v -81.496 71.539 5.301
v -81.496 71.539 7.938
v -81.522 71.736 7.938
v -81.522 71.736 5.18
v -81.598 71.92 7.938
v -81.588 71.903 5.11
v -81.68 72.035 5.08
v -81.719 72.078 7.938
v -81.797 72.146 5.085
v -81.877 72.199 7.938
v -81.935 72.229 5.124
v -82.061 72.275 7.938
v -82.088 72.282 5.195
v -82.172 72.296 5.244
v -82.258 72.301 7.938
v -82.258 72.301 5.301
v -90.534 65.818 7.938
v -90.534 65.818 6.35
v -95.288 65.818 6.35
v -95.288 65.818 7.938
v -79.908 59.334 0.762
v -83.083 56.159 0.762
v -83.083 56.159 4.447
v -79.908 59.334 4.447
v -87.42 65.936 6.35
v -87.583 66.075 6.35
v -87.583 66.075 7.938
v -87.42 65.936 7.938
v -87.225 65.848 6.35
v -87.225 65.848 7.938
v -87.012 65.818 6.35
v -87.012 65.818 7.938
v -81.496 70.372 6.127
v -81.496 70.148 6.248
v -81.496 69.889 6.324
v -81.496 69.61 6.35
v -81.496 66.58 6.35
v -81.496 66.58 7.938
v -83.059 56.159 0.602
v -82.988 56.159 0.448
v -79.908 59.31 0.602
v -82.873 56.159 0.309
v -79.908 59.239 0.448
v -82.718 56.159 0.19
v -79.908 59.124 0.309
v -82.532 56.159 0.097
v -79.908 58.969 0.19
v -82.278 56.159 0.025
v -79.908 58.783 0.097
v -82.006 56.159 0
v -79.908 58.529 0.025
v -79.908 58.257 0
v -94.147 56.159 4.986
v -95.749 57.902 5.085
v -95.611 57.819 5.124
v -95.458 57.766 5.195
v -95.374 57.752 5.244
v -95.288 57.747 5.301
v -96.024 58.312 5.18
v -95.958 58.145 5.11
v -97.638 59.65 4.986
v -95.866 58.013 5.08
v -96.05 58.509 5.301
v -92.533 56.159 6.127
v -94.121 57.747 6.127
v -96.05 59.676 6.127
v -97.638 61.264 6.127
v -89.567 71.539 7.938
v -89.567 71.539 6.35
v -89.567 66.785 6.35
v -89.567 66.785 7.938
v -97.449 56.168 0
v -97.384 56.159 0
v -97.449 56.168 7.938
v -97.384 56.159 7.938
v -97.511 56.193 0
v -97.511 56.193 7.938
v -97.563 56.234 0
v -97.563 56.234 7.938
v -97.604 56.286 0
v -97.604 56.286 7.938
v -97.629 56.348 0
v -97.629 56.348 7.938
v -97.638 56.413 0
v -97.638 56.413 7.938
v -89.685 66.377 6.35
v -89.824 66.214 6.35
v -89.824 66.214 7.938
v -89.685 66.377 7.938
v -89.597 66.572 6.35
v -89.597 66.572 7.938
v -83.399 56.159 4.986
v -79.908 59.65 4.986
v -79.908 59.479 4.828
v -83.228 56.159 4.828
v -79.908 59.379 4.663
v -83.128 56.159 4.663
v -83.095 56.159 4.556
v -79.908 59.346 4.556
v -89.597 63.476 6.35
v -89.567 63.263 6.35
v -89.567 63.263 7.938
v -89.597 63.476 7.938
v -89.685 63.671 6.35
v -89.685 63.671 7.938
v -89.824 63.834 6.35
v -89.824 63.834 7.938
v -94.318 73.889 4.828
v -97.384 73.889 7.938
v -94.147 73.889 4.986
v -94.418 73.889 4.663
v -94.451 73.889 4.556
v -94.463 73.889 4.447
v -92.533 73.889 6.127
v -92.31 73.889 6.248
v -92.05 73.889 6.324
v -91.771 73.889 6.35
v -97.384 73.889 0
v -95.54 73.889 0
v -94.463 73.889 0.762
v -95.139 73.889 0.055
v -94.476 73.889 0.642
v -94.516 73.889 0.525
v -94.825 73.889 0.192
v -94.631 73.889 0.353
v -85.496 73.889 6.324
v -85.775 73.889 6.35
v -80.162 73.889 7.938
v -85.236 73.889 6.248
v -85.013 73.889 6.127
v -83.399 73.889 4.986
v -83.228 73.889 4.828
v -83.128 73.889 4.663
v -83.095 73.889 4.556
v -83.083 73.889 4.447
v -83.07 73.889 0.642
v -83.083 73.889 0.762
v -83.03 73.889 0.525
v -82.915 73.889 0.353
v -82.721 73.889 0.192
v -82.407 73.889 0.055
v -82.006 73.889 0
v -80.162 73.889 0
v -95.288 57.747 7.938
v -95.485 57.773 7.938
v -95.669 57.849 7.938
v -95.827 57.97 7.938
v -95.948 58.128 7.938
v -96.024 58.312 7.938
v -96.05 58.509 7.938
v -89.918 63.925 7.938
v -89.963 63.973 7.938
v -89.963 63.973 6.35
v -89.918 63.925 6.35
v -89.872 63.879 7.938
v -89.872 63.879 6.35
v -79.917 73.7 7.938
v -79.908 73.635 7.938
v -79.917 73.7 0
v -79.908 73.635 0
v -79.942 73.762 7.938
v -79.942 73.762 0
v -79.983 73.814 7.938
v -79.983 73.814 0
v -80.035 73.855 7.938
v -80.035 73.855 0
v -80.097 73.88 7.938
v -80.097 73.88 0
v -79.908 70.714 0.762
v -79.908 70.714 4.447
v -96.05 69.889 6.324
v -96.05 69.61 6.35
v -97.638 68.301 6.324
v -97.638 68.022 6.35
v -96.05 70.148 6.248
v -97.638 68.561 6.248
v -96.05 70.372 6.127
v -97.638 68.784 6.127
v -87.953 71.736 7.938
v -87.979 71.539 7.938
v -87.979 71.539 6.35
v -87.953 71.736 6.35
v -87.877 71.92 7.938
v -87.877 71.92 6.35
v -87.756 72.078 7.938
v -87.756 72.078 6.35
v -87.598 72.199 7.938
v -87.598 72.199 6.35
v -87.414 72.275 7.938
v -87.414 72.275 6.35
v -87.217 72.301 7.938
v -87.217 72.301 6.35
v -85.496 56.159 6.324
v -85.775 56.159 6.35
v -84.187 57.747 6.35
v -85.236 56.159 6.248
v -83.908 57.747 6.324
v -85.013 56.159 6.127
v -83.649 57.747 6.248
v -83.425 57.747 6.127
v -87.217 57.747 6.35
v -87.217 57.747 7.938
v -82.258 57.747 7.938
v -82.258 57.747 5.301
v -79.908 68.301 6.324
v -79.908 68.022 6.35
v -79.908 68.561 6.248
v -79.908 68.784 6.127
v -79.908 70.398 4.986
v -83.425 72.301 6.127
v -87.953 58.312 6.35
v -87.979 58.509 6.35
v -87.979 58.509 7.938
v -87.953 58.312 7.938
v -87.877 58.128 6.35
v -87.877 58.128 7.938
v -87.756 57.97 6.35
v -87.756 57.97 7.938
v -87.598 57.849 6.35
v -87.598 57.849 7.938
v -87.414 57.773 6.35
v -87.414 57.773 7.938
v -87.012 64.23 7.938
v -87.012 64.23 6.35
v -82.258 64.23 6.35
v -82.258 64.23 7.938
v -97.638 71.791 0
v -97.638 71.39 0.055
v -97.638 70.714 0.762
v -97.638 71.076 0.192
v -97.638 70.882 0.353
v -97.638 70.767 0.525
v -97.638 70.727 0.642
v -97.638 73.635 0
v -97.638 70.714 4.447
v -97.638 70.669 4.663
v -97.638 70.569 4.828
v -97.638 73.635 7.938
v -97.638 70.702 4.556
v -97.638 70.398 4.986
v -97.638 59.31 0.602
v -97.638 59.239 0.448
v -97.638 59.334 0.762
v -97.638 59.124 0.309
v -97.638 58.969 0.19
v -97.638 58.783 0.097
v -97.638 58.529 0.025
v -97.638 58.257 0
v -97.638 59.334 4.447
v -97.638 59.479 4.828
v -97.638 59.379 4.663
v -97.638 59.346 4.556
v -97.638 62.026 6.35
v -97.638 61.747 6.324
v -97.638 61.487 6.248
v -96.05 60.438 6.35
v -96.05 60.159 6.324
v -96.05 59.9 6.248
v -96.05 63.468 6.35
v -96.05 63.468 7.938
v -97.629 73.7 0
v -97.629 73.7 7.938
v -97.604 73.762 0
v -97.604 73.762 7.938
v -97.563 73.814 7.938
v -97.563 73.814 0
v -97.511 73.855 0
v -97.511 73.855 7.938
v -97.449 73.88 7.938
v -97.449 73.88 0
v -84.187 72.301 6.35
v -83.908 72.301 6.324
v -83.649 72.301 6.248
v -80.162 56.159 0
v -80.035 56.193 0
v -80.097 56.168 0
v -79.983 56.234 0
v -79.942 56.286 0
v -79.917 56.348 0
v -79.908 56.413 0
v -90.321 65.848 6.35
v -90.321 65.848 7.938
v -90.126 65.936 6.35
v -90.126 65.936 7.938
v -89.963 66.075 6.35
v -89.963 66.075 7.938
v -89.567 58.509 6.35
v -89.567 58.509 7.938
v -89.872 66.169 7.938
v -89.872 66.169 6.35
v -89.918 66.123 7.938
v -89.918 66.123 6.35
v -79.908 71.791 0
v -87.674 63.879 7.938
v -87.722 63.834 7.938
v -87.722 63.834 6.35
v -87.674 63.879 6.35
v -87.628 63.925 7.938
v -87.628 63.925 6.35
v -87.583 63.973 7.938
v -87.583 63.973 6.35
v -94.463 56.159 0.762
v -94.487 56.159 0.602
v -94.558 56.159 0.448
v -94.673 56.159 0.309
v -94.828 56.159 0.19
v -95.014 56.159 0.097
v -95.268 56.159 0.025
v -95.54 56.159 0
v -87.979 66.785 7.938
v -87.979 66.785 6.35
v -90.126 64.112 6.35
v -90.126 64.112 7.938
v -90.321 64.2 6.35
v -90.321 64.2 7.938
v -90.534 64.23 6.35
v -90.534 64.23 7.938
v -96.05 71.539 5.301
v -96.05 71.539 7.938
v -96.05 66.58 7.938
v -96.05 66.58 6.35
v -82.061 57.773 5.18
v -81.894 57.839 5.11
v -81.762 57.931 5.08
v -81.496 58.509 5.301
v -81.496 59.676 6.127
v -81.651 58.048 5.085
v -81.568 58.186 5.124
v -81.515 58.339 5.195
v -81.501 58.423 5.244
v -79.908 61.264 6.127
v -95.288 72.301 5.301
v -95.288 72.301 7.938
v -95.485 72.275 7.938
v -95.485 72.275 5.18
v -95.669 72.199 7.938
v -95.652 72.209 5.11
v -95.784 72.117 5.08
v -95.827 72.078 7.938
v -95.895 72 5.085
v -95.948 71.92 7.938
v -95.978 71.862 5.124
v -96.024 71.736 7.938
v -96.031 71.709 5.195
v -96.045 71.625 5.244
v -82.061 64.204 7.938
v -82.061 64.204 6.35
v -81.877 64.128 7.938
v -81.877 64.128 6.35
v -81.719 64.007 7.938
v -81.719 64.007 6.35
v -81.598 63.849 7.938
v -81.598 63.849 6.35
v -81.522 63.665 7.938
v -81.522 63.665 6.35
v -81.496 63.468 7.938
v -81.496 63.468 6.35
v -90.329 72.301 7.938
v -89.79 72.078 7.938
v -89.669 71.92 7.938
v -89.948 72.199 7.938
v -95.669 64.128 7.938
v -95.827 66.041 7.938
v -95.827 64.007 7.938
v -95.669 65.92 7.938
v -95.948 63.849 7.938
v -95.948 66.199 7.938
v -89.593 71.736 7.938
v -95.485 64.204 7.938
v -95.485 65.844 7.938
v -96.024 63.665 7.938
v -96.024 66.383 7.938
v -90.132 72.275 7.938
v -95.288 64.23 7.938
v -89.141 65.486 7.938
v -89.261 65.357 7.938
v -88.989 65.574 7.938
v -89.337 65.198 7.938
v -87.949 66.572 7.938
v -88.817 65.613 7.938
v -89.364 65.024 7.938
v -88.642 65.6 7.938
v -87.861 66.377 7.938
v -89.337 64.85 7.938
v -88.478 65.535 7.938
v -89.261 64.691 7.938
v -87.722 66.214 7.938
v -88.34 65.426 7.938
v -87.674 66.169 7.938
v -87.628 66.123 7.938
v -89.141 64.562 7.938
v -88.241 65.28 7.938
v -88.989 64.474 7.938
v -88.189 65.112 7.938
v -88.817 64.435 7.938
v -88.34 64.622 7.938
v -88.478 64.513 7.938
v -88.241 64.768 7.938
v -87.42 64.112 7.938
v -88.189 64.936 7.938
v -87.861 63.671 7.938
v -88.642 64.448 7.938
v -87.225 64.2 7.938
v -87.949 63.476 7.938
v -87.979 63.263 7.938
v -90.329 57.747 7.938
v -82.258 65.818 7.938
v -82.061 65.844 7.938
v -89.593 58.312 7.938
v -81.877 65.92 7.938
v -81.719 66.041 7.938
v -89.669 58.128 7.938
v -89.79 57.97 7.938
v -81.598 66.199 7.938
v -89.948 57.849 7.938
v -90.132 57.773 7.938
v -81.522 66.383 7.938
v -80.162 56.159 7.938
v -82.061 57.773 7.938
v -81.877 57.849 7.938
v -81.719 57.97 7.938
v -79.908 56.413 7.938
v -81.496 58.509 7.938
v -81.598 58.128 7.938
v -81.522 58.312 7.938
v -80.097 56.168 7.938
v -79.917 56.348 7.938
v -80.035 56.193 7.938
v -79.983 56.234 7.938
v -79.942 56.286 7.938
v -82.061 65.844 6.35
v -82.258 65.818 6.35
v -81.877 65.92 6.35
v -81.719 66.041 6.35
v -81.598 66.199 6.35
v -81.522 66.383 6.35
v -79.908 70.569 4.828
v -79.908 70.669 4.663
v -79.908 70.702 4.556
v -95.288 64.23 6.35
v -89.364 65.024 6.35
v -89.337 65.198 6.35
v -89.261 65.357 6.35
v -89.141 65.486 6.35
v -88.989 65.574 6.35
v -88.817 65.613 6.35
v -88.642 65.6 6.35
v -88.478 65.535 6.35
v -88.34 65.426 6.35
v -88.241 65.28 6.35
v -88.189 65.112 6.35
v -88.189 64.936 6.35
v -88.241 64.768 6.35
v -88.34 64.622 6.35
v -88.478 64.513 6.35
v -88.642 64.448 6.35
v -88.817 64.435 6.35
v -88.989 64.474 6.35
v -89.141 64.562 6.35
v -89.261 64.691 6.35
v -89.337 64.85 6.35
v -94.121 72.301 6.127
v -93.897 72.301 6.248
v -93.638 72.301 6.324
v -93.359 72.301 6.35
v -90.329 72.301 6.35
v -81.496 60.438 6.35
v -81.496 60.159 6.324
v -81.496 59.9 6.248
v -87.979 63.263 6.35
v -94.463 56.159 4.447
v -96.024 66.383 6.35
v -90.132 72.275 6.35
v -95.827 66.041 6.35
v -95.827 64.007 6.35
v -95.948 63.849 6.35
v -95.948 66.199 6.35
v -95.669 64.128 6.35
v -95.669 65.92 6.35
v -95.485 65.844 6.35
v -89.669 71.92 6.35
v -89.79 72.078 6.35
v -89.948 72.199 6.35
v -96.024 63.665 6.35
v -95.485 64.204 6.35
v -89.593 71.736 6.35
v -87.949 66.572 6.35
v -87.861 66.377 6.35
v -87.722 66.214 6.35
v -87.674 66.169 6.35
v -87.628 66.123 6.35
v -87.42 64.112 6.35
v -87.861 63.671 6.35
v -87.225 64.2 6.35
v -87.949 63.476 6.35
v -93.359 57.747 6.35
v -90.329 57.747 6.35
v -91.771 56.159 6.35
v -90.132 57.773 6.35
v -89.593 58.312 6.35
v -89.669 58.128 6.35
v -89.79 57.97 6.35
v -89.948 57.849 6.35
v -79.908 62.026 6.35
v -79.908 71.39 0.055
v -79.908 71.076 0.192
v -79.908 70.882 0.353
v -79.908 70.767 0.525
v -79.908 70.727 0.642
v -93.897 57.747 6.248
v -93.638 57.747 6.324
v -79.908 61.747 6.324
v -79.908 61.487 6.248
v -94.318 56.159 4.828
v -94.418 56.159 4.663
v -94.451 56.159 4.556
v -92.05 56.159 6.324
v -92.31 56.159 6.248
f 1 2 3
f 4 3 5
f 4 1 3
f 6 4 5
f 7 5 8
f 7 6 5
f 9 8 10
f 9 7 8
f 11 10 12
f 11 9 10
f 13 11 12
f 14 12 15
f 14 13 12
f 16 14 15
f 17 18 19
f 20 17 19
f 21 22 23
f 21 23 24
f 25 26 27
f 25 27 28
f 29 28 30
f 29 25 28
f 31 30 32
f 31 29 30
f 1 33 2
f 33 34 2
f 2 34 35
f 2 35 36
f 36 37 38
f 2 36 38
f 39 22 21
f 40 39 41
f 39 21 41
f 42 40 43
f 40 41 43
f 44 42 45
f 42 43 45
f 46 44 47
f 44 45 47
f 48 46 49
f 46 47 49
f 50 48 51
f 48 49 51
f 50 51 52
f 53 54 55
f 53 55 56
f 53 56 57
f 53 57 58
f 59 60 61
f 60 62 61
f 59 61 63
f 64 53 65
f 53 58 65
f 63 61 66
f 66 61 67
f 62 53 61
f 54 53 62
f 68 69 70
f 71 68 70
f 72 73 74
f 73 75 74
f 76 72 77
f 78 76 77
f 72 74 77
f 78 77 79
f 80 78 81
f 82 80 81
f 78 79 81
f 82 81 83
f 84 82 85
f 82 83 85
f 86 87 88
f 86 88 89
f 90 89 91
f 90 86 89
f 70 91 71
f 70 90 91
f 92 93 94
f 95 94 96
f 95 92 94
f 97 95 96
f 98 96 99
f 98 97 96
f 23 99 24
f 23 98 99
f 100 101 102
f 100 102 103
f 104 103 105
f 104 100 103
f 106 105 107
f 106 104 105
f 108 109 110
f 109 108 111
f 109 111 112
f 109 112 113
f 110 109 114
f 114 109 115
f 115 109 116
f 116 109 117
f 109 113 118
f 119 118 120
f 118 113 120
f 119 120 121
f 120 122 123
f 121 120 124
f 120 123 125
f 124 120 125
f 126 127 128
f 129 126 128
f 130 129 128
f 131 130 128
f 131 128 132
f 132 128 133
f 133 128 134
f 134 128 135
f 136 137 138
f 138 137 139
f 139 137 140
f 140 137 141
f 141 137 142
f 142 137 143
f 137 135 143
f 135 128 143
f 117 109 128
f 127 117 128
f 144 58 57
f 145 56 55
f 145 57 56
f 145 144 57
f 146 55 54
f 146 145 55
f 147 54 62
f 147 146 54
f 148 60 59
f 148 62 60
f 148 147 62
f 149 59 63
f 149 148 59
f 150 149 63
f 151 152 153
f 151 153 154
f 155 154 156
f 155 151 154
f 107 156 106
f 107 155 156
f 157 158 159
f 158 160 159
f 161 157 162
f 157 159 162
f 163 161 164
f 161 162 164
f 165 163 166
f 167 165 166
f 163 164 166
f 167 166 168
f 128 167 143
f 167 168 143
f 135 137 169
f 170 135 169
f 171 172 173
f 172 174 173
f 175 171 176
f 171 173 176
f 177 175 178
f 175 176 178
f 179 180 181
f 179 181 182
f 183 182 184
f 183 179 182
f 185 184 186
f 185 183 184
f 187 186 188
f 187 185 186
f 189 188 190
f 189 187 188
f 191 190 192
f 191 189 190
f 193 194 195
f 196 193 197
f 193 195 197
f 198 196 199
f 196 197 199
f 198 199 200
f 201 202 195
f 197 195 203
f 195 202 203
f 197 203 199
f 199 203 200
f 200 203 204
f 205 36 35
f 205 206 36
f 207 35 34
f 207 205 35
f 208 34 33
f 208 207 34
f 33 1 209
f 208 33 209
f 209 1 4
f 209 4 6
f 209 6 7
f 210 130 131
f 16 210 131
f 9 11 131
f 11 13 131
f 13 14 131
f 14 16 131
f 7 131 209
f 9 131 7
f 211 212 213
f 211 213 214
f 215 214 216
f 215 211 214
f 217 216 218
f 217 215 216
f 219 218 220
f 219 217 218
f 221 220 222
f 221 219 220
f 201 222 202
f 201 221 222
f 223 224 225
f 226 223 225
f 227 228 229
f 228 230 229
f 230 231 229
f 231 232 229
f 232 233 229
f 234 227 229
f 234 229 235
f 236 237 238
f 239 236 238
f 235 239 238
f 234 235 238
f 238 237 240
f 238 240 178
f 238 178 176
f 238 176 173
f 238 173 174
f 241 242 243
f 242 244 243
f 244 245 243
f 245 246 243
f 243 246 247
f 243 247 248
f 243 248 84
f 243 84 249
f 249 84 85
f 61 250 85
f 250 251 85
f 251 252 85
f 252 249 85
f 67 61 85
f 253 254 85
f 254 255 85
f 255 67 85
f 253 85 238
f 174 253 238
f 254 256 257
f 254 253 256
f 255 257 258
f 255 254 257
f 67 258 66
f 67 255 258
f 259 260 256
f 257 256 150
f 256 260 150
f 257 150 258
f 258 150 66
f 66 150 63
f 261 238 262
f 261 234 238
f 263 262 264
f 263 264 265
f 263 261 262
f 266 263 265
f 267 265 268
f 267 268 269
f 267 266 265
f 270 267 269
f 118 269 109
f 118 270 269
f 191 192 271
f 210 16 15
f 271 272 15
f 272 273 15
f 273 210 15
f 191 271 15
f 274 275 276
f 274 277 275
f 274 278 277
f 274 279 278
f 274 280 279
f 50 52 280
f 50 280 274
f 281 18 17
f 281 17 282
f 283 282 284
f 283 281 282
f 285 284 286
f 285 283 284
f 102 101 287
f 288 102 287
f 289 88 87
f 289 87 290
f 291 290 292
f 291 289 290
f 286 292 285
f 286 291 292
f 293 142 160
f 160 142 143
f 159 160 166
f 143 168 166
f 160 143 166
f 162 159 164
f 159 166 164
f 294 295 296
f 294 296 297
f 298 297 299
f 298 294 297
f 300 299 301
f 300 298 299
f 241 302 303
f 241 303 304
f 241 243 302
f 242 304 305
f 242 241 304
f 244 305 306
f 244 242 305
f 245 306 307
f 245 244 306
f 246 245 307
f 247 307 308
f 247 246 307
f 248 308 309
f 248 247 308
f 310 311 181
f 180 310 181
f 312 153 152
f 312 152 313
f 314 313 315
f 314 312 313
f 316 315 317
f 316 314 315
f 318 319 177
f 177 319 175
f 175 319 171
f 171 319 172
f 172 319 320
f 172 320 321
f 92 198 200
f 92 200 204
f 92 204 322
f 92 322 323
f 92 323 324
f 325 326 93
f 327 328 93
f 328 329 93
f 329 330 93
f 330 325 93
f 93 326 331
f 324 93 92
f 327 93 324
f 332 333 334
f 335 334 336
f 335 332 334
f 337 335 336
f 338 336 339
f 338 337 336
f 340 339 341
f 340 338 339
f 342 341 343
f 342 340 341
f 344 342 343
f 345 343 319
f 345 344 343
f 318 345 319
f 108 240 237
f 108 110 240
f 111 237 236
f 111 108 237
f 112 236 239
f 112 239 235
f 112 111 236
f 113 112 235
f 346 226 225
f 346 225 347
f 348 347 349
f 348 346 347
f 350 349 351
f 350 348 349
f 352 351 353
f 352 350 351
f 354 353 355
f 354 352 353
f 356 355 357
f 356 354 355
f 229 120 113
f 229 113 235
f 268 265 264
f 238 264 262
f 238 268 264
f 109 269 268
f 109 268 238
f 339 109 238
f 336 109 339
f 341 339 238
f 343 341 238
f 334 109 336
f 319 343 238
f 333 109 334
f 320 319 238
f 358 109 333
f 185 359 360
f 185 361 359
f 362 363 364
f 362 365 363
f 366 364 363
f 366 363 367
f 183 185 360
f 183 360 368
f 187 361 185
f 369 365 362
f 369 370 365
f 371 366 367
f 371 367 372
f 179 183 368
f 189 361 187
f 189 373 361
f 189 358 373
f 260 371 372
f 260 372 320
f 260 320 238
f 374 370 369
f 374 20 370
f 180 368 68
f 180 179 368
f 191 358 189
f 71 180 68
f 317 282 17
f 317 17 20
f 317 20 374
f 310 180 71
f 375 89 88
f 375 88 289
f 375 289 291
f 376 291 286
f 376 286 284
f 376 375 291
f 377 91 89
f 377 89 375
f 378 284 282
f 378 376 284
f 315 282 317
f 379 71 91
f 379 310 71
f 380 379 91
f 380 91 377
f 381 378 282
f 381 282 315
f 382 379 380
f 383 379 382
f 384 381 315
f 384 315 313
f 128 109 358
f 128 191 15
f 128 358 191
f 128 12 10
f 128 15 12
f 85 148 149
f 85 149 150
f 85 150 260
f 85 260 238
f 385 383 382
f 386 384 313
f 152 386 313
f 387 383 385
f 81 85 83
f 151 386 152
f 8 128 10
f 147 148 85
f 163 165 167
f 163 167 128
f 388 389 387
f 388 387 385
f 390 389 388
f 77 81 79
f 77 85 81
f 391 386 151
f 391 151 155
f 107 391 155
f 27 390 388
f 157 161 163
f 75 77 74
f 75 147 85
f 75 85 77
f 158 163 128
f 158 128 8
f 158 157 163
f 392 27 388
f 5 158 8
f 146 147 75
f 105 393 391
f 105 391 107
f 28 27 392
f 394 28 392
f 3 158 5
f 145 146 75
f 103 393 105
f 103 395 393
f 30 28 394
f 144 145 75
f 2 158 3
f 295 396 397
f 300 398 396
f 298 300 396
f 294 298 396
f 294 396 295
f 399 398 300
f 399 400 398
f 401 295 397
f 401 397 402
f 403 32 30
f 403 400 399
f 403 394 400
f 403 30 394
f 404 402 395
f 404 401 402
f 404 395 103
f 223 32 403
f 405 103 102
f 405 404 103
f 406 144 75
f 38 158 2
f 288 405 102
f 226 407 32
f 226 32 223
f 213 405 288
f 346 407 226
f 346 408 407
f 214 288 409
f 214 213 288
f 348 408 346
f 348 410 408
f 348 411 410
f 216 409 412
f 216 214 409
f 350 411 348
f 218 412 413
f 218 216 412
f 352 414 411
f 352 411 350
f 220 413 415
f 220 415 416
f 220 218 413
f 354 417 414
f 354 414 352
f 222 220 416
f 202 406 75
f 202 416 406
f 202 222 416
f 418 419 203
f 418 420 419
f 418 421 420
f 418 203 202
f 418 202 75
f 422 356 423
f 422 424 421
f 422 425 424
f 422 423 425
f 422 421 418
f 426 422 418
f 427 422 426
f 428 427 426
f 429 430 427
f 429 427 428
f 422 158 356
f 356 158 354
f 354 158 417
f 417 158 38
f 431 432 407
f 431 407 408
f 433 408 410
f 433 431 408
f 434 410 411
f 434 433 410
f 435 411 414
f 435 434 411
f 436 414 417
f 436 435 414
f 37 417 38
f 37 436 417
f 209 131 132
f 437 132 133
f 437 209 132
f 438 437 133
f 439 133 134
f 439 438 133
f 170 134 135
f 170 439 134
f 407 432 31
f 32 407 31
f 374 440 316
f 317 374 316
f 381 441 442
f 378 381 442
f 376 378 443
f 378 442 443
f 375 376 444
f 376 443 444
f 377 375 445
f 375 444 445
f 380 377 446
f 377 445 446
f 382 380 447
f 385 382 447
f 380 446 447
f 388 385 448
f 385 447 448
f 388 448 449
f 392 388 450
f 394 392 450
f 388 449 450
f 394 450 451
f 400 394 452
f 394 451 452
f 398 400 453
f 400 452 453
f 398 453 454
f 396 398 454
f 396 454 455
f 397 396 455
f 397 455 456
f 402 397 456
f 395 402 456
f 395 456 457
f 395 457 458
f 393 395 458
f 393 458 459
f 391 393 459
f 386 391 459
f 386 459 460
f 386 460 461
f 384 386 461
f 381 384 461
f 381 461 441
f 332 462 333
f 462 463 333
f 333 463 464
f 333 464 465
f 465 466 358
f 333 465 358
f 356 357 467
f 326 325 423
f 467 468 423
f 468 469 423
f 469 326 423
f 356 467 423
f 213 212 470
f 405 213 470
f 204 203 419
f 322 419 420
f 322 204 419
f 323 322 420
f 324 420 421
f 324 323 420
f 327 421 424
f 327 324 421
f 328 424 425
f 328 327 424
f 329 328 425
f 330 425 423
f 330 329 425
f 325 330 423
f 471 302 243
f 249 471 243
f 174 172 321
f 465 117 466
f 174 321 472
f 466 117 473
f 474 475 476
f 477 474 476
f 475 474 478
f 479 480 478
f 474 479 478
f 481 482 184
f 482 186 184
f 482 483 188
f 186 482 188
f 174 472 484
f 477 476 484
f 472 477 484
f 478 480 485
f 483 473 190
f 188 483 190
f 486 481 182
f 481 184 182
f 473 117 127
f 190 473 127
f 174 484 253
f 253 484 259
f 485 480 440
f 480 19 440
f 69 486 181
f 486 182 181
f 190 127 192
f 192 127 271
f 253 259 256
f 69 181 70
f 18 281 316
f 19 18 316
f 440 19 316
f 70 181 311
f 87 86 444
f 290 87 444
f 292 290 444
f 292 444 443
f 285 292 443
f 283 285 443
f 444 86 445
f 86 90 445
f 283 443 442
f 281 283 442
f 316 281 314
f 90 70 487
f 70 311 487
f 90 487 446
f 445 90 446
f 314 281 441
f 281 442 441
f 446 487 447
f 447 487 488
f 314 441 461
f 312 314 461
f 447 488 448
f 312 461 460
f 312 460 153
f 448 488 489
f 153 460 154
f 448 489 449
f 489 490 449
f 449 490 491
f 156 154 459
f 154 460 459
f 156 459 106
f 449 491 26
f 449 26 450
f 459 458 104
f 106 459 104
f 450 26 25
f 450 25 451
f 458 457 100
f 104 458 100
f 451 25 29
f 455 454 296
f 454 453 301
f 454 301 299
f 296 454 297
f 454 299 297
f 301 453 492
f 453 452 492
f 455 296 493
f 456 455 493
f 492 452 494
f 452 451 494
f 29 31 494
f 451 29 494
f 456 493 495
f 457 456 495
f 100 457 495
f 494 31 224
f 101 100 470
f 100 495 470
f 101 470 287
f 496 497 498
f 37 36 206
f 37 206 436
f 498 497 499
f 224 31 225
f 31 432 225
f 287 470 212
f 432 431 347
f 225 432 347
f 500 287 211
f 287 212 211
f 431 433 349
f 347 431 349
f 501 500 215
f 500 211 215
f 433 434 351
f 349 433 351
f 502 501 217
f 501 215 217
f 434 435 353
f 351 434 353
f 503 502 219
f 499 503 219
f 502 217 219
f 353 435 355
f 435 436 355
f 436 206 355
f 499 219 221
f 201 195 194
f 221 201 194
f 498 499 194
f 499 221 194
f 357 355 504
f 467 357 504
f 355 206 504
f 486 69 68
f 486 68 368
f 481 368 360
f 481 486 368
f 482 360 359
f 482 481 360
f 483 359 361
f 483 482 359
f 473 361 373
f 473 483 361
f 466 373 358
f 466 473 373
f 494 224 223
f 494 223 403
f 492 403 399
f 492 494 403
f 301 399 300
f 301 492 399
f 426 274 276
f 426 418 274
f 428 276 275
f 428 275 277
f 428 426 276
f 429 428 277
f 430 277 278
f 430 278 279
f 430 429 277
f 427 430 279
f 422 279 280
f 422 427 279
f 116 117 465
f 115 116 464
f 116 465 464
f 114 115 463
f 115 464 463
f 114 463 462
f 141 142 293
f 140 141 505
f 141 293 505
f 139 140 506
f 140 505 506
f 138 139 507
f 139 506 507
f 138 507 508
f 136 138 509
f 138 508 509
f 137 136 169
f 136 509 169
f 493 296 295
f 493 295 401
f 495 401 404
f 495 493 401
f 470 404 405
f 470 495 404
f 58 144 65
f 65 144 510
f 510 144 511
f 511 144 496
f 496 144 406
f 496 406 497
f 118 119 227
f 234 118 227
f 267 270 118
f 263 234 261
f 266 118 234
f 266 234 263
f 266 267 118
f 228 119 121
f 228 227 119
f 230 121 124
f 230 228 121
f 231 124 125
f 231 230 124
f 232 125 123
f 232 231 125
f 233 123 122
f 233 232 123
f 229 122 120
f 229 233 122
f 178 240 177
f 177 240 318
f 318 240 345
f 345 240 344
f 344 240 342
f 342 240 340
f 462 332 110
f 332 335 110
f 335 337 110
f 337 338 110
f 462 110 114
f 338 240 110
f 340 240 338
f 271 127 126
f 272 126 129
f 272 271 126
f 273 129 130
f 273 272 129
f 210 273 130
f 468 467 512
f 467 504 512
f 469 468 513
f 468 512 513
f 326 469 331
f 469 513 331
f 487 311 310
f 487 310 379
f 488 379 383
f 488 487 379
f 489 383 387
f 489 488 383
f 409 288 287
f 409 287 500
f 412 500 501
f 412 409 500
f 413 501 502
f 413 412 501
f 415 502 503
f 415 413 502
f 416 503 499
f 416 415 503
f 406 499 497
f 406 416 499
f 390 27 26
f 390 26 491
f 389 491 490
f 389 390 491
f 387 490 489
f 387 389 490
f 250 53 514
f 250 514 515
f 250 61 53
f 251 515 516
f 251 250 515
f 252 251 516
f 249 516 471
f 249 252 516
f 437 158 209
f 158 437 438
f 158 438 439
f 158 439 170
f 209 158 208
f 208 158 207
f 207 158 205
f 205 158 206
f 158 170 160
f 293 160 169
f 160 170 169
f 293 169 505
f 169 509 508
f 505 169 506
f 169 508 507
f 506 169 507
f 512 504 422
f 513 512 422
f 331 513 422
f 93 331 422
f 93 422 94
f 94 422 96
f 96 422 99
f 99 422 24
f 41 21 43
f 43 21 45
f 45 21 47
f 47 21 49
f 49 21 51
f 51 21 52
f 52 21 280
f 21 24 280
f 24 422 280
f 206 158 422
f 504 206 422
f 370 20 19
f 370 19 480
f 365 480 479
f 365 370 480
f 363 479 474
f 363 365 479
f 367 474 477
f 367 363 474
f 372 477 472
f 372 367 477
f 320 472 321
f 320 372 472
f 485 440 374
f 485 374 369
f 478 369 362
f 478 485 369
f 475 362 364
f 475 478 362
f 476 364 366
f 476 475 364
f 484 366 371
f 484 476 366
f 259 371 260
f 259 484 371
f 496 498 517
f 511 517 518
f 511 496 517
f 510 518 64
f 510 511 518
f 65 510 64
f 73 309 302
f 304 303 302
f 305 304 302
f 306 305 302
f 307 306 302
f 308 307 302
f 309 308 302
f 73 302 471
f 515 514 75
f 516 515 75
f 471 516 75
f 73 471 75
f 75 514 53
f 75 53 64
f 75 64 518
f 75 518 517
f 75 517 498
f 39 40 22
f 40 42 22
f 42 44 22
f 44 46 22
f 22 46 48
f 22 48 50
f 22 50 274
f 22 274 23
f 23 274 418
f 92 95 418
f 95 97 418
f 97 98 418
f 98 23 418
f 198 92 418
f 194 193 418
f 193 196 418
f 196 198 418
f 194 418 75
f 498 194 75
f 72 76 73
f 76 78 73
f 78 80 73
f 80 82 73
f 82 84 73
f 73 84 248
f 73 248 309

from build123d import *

# Parameters (mm, degrees)
BOSS_EXTRUDE1_DEPTH          = 6.35
BOSS_EXTRUDE1_2_DEPTH        = 6.35
BOSS_EXTRUDE1_3_DEPTH        = 6.35
BOSS_EXTRUDE1_4_DEPTH        = 6.35
EXTRUDE_THIN1_DEPTH          = 1.5875
SKETCH2_3_W                  = 17.7292
SKETCH2_3_H                  = 17.7292
SKETCH2_3_W_2                = 14.5542
SKETCH2_3_H_2                = 14.5542
EXTRUDE_THIN2_DEPTH          = 1.5875
SKETCH6_R                    = 1.5875
BOSS_EXTRUDE3_DEPTH          = 1.5875
F_56_0_0465_DIAMETER_HOLE1_D = 1.1811
CHAMFER1_SIZE                = 1.5875
FILLET2_R                    = 0.762
FILLET3_R                    = 0.762
FILLET4_R                    = 0.254


# Read off the part's stored shape, not the designer's step: Extrude-Thin1
with BuildPart() as part:
    # Sketch1 → Boss-Extrude1 (new body)
    with BuildSketch(Plane.XY):
        Polygon((-97.6376, 73.8886), (-94.4626, 73.8886), (-97.6376, 70.7136), align=None)
    extrude(amount=BOSS_EXTRUDE1_DEPTH)



with BuildPart() as body_2:
    # Sketch1 → Boss-Extrude1 2 (new body)
    with BuildSketch(Plane.XY):
        Polygon((-79.9084, 70.7136), (-79.9084, 73.8886), (-83.0834, 73.8886), align=None)
    extrude(amount=BOSS_EXTRUDE1_2_DEPTH)


with BuildPart() as body_3:
    # Sketch1 → Boss-Extrude1 3 (new body)
    with BuildSketch(Plane.XY):
        Polygon((-79.9084, 56.1594), (-83.0834, 56.1594), (-79.9084, 59.3344), align=None)
    extrude(amount=BOSS_EXTRUDE1_3_DEPTH)


with BuildPart() as body_4:
    # Sketch1 → Boss-Extrude1 4 (new body)
    with BuildSketch(Plane.XY):
        Polygon((-97.6376, 59.3344), (-97.6376, 56.1594), (-94.4626, 56.1594), align=None)
    extrude(amount=BOSS_EXTRUDE1_4_DEPTH)


with BuildPart() as body_5:
    # Extrude-Thin1 outline → Extrude-Thin1 (new body)
    with BuildSketch(Plane.XY.offset(6.35)):
        Polygon((-89.56675, 65.81775), (-97.6376, 65.81775), (-97.6376, 64.23025), (-89.56675, 64.23025), (-89.56675, 56.1594), (-87.97925, 56.1594), (-87.97925, 64.23025), (-79.9084, 64.23025), (-79.9084, 65.81775), (-87.97925, 65.81775), (-87.97925, 73.8886), (-89.56675, 73.8886), align=None)
    extrude(amount=EXTRUDE_THIN1_DEPTH)


with BuildPart() as part_1:
    add(part.part)

    add(body_2.part)  # Extrude-Thin2 merges body 2

    add(body_3.part)  # Extrude-Thin2 merges body 3

    add(body_4.part)  # Extrude-Thin2 merges body 4

    add(body_5.part)  # Extrude-Thin2 merges body 5
    # Sketch2<3> → Extrude-Thin2 (add)
    with BuildSketch(Plane.XY.offset(6.35)):
        with Locations((-88.773, 65.024)):
            Rectangle(SKETCH2_3_W, SKETCH2_3_H)
        with Locations((-88.773, 65.024)):
            Rectangle(SKETCH2_3_W_2, SKETCH2_3_H_2, mode=Mode.SUBTRACT)
    extrude(amount=EXTRUDE_THIN2_DEPTH)

    # Sketch6 → Boss-Extrude3 (add)
    with BuildSketch(Plane.XY.offset(7.9375)):
        with Locations((-88.773, 65.024)):
            Circle(SKETCH6_R)
    extrude(amount=-BOSS_EXTRUDE3_DEPTH)

    # #56 (0.0465) Diameter Hole1 (through all)
    with Locations(Plane.XY.offset(7.9375)):
        with Locations((-88.773, 65.024)):
            Hole(F_56_0_0465_DIAMETER_HOLE1_D / 2)

    # Chamfer1
    # the kernel refuses this chamfer: 1.5875 mm, written as the material it adds along each edge
    with BuildSketch(Plane(origin=(-85.970196487, 53.272603513, 6.35), x_dir=(-0.7068394360706735, 0.7068394360706735, 0.02749587661058616), z_dir=(0.7071067811865476, 0.7071067811865476, 0))) as chamfer1_piece_1_section:
        Polygon((CHAMFER1_SIZE * 0.999621916911, -CHAMFER1_SIZE * 0.0274958766106), (-CHAMFER1_SIZE * 0.0274958766106, -CHAMFER1_SIZE * 0.999621916911), (0, 0), align=None)
    chamfer1_piece_1 = extrude(amount=6.327610774, mode=Mode.PRIVATE)
    chamfer1_piece_1 = split(chamfer1_piece_1, bisect_by=Plane(origin=(-83.03148044, 56.1594, 5.826998953), z_dir=(0, 1, 0)), keep=Keep.TOP, mode=Mode.PRIVATE)
    chamfer1_piece_1 = split(chamfer1_piece_1, bisect_by=Plane(origin=(-83.03148044, 57.7469, 5.826998953), z_dir=(0, -1, 0)), keep=Keep.TOP, mode=Mode.PRIVATE)
    add(chamfer1_piece_1)
    with BuildSketch(Plane(origin=(-81.4959, 57.7469, 6.35), x_dir=(-0.7068394360706735, 0.7068394360706735, 0.02749587661058616), z_dir=(0.7071067811865476, 0.7071067811865476, 0))) as chamfer1_piece_2_section:
        Polygon((CHAMFER1_SIZE * 0.999621916911, -CHAMFER1_SIZE * 0.0274958766106), (-CHAMFER1_SIZE * 0.0274958766106, -CHAMFER1_SIZE * 0.999621916911), (0, 0), align=None)
    chamfer1_piece_2 = extrude(amount=6.327610774, mode=Mode.PRIVATE)
    chamfer1_piece_2 = split(chamfer1_piece_2, bisect_by=Plane(origin=(-79.9084, 59.28248044, 5.826998953), z_dir=(-1, 0, 0)), keep=Keep.TOP, mode=Mode.PRIVATE)
    chamfer1_piece_2 = split(chamfer1_piece_2, bisect_by=Plane(origin=(-81.4959, 59.28248044, 5.826998953), z_dir=(1, 0, 0)), keep=Keep.TOP, mode=Mode.PRIVATE)
    add(chamfer1_piece_2)
    with BuildSketch(Plane(origin=(-81.4959, 72.3011, 6.35), x_dir=(0.01944252080601567, 0.01944252080601567, -0.9996219169112966), z_dir=(0.7071067811865476, -0.7071067811865476, 0))) as chamfer1_piece_3_section:
        Polygon((CHAMFER1_SIZE * 0.999621916911, -CHAMFER1_SIZE * 0.0274958766106), (-CHAMFER1_SIZE * 0.0274958766106, -CHAMFER1_SIZE * 0.999621916911), (0, 0), align=None)
    chamfer1_piece_3 = extrude(amount=6.327610774, mode=Mode.PRIVATE)
    chamfer1_piece_3 = split(chamfer1_piece_3, bisect_by=Plane(origin=(-79.9084, 72.313041711, 5.228115698), z_dir=(-1, 0, 0)), keep=Keep.TOP, mode=Mode.PRIVATE)
    chamfer1_piece_3 = split(chamfer1_piece_3, bisect_by=Plane(origin=(-81.4959, 72.313041711, 5.228115698), z_dir=(1, 0, 0)), keep=Keep.TOP, mode=Mode.PRIVATE)
    add(chamfer1_piece_3)
    with BuildSketch(Plane(origin=(-85.970196487, 76.775396487, 6.35), x_dir=(0.01944252080601567, 0.01944252080601567, -0.9996219169112966), z_dir=(0.7071067811865476, -0.7071067811865476, 0))) as chamfer1_piece_4_section:
        Polygon((CHAMFER1_SIZE * 0.999621916911, -CHAMFER1_SIZE * 0.0274958766106), (-CHAMFER1_SIZE * 0.0274958766106, -CHAMFER1_SIZE * 0.999621916911), (0, 0), align=None)
    chamfer1_piece_4 = extrude(amount=6.327610774, mode=Mode.PRIVATE)
    chamfer1_piece_4 = split(chamfer1_piece_4, bisect_by=Plane(origin=(-83.03148044, 73.8886, 5.826998953), z_dir=(0, -1, 0)), keep=Keep.TOP, mode=Mode.PRIVATE)
    chamfer1_piece_4 = split(chamfer1_piece_4, bisect_by=Plane(origin=(-83.03148044, 72.3011, 5.826998953), z_dir=(0, 1, 0)), keep=Keep.TOP, mode=Mode.PRIVATE)
    add(chamfer1_piece_4)
    with BuildSketch(Plane(origin=(-91.575803513, 76.775396487, 6.35), x_dir=(0.7068394360706735, -0.7068394360706735, 0.02749587661058616), z_dir=(-0.7071067811865476, -0.7071067811865476, 0))) as chamfer1_piece_5_section:
        Polygon((CHAMFER1_SIZE * 0.999621916911, -CHAMFER1_SIZE * 0.0274958766106), (-CHAMFER1_SIZE * 0.0274958766106, -CHAMFER1_SIZE * 0.999621916911), (0, 0), align=None)
    chamfer1_piece_5 = extrude(amount=6.327610774, mode=Mode.PRIVATE)
    chamfer1_piece_5 = split(chamfer1_piece_5, bisect_by=Plane(origin=(-94.51451956, 73.8886, 5.826998953), z_dir=(0, -1, 0)), keep=Keep.TOP, mode=Mode.PRIVATE)
    chamfer1_piece_5 = split(chamfer1_piece_5, bisect_by=Plane(origin=(-94.51451956, 72.3011, 5.826998953), z_dir=(0, 1, 0)), keep=Keep.TOP, mode=Mode.PRIVATE)
    add(chamfer1_piece_5)
    with BuildSketch(Plane(origin=(-96.0501, 72.3011, 6.35), x_dir=(0.7068394360706735, -0.7068394360706735, 0.02749587661058616), z_dir=(-0.7071067811865476, -0.7071067811865476, 0))) as chamfer1_piece_6_section:
        Polygon((CHAMFER1_SIZE * 0.999621916911, -CHAMFER1_SIZE * 0.0274958766106), (-CHAMFER1_SIZE * 0.0274958766106, -CHAMFER1_SIZE * 0.999621916911), (0, 0), align=None)
    chamfer1_piece_6 = extrude(amount=6.327610774, mode=Mode.PRIVATE)
    chamfer1_piece_6 = split(chamfer1_piece_6, bisect_by=Plane(origin=(-97.6376, 70.76551956, 5.826998953), z_dir=(1, 0, 0)), keep=Keep.TOP, mode=Mode.PRIVATE)
    chamfer1_piece_6 = split(chamfer1_piece_6, bisect_by=Plane(origin=(-96.0501, 70.76551956, 5.826998953), z_dir=(-1, 0, 0)), keep=Keep.TOP, mode=Mode.PRIVATE)
    add(chamfer1_piece_6)
    with BuildSketch(Plane(origin=(-91.575803513, 53.272603513, 6.35), x_dir=(0.7068394360706735, 0.7068394360706735, 0.027495876610586705), z_dir=(-0.7071067811865476, 0.7071067811865476, 0))) as chamfer1_piece_7_section:
        Polygon((CHAMFER1_SIZE * 0.999621916911, CHAMFER1_SIZE * 0.0274958766106), (-CHAMFER1_SIZE * 0.0274958766106, CHAMFER1_SIZE * 0.999621916911), (0, 0), align=None)
    chamfer1_piece_7 = extrude(amount=6.327610774, mode=Mode.PRIVATE)
    chamfer1_piece_7 = split(chamfer1_piece_7, bisect_by=Plane(origin=(-94.51451956, 56.1594, 5.826998953), z_dir=(0, 1, 0)), keep=Keep.TOP, mode=Mode.PRIVATE)
    chamfer1_piece_7 = split(chamfer1_piece_7, bisect_by=Plane(origin=(-94.51451956, 57.7469, 5.826998953), z_dir=(0, -1, 0)), keep=Keep.TOP, mode=Mode.PRIVATE)
    add(chamfer1_piece_7)
    with BuildSketch(Plane(origin=(-96.0501, 57.7469, 6.35), x_dir=(0.7068394360706735, 0.7068394360706735, 0.02749587661058616), z_dir=(-0.7071067811865476, 0.7071067811865476, 0))) as chamfer1_piece_8_section:
        Polygon((CHAMFER1_SIZE * 0.999621916911, CHAMFER1_SIZE * 0.0274958766106), (-CHAMFER1_SIZE * 0.0274958766106, CHAMFER1_SIZE * 0.999621916911), (0, 0), align=None)
    chamfer1_piece_8 = extrude(amount=6.327610774, mode=Mode.PRIVATE)
    chamfer1_piece_8 = split(chamfer1_piece_8, bisect_by=Plane(origin=(-97.6376, 59.28248044, 5.826998953), z_dir=(1, 0, 0)), keep=Keep.TOP, mode=Mode.PRIVATE)
    chamfer1_piece_8 = split(chamfer1_piece_8, bisect_by=Plane(origin=(-96.0501, 59.28248044, 5.826998953), z_dir=(-1, 0, 0)), keep=Keep.TOP, mode=Mode.PRIVATE)
    add(chamfer1_piece_8)

    # Fillet2
    # the kernel refuses this fillet: 0.762 mm, written as the material it adds along each edge
    with BuildSketch(Plane(origin=(-90.147815329, 64.23025, 6.35), x_dir=(-1, 0, 0), z_dir=(0, 0, 1)), Plane(origin=(-89.56675, 66.398815329, 6.35), x_dir=(0, 1, 0), z_dir=(0, 0, 1)), Plane(origin=(-87.97925, 63.649184671, 6.35), x_dir=(0, -1, 0), z_dir=(0, 0, 1)), Plane(origin=(-87.398184671, 65.81775, 6.35), x_dir=(1, 0, 0), z_dir=(0, 0, 1))) as fillet2_piece_1:
        with BuildLine():
            CenterArc((0.385807342, 0.762), FILLET2_R, 221.464980775, 48.535019225)
            ThreePointArc((-0.185205416, 0.257432432), (-0.086158249, 0.133352573), (0, 0))
            Line((0, 0), (0.385807342, 0))
        make_face()
    extrude(amount=1.5875)
    with BuildSketch(Plane(origin=(-90.147815329, 65.81775, 6.35), x_dir=(0.5840016210353491, 0.8117524909897625, 0), z_dir=(0, 0, 1)), Plane(origin=(-87.398184671, 64.23025, 6.35), x_dir=(-0.5840016210353066, -0.8117524909897931, 0), z_dir=(0, 0, 1)), Plane(origin=(-89.56675, 63.649184671, 6.35), x_dir=(-0.8117524909898051, 0.5840016210352901, 0), z_dir=(0, 0, 1)), Plane(origin=(-87.97925, 66.398815329, 6.35), x_dir=(0.811752490989754, -0.584001621035361, 0), z_dir=(0, 0, 1))) as fillet2_piece_2:
        with BuildLine():
            CenterArc((0.393243285, 0.758189306), FILLET2_R, 215.732490387, 48.535019225)
            Line((-0.225312113, 0.313180071), (0, 0))
            ThreePointArc((0, 0), (0.158565841, 0.007938946), (0.317131681, 0))
        make_face()
    extrude(amount=1.5875)
    with BuildSketch(Plane(origin=(-96.0501, 72.3011, 2.8575), x_dir=(1, 0, 0), z_dir=(0, 0, 1))) as fillet2_piece_3_section:
        with BuildLine():
            CenterArc((FILLET2_R, -FILLET2_R), FILLET2_R, 90, 90)
            Line((0, -FILLET2_R), (0, 0))
            Line((0, 0), (FILLET2_R, 0))
        make_face()
    fillet2_piece_3 = extrude(amount=5.08, mode=Mode.PRIVATE)
    fillet2_piece_3 = split(fillet2_piece_3, bisect_by=Plane(origin=(-95.361447412, 71.612447412, 5.73640183), z_dir=(-0.5000000000001895, 0.5000000000001895, 0.7071067811862797)), keep=Keep.TOP, mode=Mode.PRIVATE)
    add(fillet2_piece_3)
    with BuildSketch(Plane(origin=(-96.0501, 57.7469, 7.9375), x_dir=(0, 1, 0), z_dir=(0, 0, -1))) as fillet2_piece_4_section:
        with BuildLine():
            CenterArc((FILLET2_R, FILLET2_R), FILLET2_R, 180, 90)
            Line((0, FILLET2_R), (0, 0))
            Line((0, 0), (FILLET2_R, 0))
        make_face()
    fillet2_piece_4 = extrude(amount=5.08, mode=Mode.PRIVATE)
    fillet2_piece_4 = split(fillet2_piece_4, bisect_by=Plane(origin=(-95.361447412, 58.435552588, 5.73640183), z_dir=(-0.5000000000001895, -0.5000000000001895, 0.7071067811862797)), keep=Keep.TOP, mode=Mode.PRIVATE)
    add(fillet2_piece_4)
    with BuildSketch(Plane(origin=(-81.4959, 57.7469, 2.8575), x_dir=(-1, 0, 0), z_dir=(0, 0, 1))) as fillet2_piece_5_section:
        with BuildLine():
            CenterArc((FILLET2_R, -FILLET2_R), FILLET2_R, 90, 90)
            Line((0, -FILLET2_R), (0, 0))
            Line((0, 0), (FILLET2_R, 0))
        make_face()
    fillet2_piece_5 = extrude(amount=5.08, mode=Mode.PRIVATE)
    fillet2_piece_5 = split(fillet2_piece_5, bisect_by=Plane(origin=(-82.184552588, 58.435552588, 5.73640183), z_dir=(0.5000000000001895, -0.5000000000001895, 0.7071067811862797)), keep=Keep.TOP, mode=Mode.PRIVATE)
    add(fillet2_piece_5)
    with BuildSketch(Plane(origin=(-81.4959, 72.3011, 2.8575), x_dir=(0, -1, 0), z_dir=(0, 0, 1))) as fillet2_piece_6_section:
        with BuildLine():
            CenterArc((FILLET2_R, -FILLET2_R), FILLET2_R, 90, 90)
            Line((0, -FILLET2_R), (0, 0))
            Line((0, 0), (FILLET2_R, 0))
        make_face()
    fillet2_piece_6 = extrude(amount=5.08, mode=Mode.PRIVATE)
    fillet2_piece_6 = split(fillet2_piece_6, bisect_by=Plane(origin=(-82.184552588, 71.612447412, 5.73640183), z_dir=(0.500000000000017, 0.500000000000017, 0.7071067811865237)), keep=Keep.TOP, mode=Mode.PRIVATE)
    add(fillet2_piece_6)
    with BuildSketch(Plane(origin=(-81.4959, 64.23025, 7.9375), x_dir=(0, -1, 0), z_dir=(0, 0, -1)), Plane(origin=(-81.4959, 65.81775, 6.35), x_dir=(0, 1, 0), z_dir=(0, 0, 1)), Plane(origin=(-87.97925, 57.7469, 6.35), x_dir=(1, 0, 0), z_dir=(0, 0, 1)), Plane(origin=(-96.0501, 64.23025, 6.35), x_dir=(0, -1, 0), z_dir=(0, 0, 1)), Plane(origin=(-87.97925, 72.3011, 7.9375), x_dir=(1, 0, 0), z_dir=(0, 0, -1))) as fillet2_piece_7:
        with BuildLine():
            CenterArc((FILLET2_R, FILLET2_R), FILLET2_R, 180, 90)
            Line((0, FILLET2_R), (0, 0))
            Line((0, 0), (FILLET2_R, 0))
        make_face()
    extrude(amount=1.5875)
    with BuildSketch(Plane(origin=(-89.56675, 57.7469, 7.9375), x_dir=(0, 1, 0), z_dir=(0, 0, -1)), Plane(origin=(-96.0501, 65.81775, 7.9375), x_dir=(1, 0, 0), z_dir=(0, 0, -1)), Plane(origin=(-89.56675, 72.3011, 6.35), x_dir=(0, -1, 0), z_dir=(0, 0, 1))) as fillet2_piece_8:
        with BuildLine():
            CenterArc((FILLET2_R, -FILLET2_R), FILLET2_R, 90, 90)
            Line((0, -FILLET2_R), (0, 0))
            Line((0, 0), (FILLET2_R, 0))
        make_face()
    extrude(amount=1.5875)

    # Fillet3
    fillet3_edges = [part_1.edges().sort_by_distance(p)[0] for p in [
        (-96.84385, 60.78571403, 6.35),
        (-93.01128597, 56.95315, 6.35),
        (-96.84385, 69.26228597, 6.35),
        (-93.01128597, 73.09485, 6.35),
        (-84.53471403, 73.09485, 6.35),
        (-80.70215, 69.26228597, 6.35),
        (-80.70215, 60.78571403, 6.35),
        (-84.53471403, 56.95315, 6.35),
        (-81.4959, 57.7469, 4.7625),
        (-81.4959, 57.7469, 4.7625),
        (-81.4959, 72.3011, 4.7625),
        (-81.4959, 72.3011, 4.7625),
        (-96.0501, 72.3011, 4.7625),
        (-96.0501, 72.3011, 4.7625),
        (-96.0501, 57.7469, 4.7625),
        (-96.0501, 57.7469, 4.7625),
        (-81.4959, 72.3011, 0),
        (-81.4959, 57.7469, 0),
        (-96.0501, 72.3011, 0),
        (-96.0501, 57.7469, 0),
    ]]
    fillet(fillet3_edges, radius=FILLET3_R)

    # Fillet4
    fillet4_edges = [part_1.edges().sort_by_distance(p)[0] for p in [
        (-79.9084, 73.8886, 3.96875),
        (-97.6376, 56.1594, 3.96875),
        (-79.9084, 56.1594, 3.96875),
        (-97.6376, 73.8886, 3.96875),
    ]]
    fillet(fillet4_edges, radius=FILLET4_R)


solid = part_1.part
